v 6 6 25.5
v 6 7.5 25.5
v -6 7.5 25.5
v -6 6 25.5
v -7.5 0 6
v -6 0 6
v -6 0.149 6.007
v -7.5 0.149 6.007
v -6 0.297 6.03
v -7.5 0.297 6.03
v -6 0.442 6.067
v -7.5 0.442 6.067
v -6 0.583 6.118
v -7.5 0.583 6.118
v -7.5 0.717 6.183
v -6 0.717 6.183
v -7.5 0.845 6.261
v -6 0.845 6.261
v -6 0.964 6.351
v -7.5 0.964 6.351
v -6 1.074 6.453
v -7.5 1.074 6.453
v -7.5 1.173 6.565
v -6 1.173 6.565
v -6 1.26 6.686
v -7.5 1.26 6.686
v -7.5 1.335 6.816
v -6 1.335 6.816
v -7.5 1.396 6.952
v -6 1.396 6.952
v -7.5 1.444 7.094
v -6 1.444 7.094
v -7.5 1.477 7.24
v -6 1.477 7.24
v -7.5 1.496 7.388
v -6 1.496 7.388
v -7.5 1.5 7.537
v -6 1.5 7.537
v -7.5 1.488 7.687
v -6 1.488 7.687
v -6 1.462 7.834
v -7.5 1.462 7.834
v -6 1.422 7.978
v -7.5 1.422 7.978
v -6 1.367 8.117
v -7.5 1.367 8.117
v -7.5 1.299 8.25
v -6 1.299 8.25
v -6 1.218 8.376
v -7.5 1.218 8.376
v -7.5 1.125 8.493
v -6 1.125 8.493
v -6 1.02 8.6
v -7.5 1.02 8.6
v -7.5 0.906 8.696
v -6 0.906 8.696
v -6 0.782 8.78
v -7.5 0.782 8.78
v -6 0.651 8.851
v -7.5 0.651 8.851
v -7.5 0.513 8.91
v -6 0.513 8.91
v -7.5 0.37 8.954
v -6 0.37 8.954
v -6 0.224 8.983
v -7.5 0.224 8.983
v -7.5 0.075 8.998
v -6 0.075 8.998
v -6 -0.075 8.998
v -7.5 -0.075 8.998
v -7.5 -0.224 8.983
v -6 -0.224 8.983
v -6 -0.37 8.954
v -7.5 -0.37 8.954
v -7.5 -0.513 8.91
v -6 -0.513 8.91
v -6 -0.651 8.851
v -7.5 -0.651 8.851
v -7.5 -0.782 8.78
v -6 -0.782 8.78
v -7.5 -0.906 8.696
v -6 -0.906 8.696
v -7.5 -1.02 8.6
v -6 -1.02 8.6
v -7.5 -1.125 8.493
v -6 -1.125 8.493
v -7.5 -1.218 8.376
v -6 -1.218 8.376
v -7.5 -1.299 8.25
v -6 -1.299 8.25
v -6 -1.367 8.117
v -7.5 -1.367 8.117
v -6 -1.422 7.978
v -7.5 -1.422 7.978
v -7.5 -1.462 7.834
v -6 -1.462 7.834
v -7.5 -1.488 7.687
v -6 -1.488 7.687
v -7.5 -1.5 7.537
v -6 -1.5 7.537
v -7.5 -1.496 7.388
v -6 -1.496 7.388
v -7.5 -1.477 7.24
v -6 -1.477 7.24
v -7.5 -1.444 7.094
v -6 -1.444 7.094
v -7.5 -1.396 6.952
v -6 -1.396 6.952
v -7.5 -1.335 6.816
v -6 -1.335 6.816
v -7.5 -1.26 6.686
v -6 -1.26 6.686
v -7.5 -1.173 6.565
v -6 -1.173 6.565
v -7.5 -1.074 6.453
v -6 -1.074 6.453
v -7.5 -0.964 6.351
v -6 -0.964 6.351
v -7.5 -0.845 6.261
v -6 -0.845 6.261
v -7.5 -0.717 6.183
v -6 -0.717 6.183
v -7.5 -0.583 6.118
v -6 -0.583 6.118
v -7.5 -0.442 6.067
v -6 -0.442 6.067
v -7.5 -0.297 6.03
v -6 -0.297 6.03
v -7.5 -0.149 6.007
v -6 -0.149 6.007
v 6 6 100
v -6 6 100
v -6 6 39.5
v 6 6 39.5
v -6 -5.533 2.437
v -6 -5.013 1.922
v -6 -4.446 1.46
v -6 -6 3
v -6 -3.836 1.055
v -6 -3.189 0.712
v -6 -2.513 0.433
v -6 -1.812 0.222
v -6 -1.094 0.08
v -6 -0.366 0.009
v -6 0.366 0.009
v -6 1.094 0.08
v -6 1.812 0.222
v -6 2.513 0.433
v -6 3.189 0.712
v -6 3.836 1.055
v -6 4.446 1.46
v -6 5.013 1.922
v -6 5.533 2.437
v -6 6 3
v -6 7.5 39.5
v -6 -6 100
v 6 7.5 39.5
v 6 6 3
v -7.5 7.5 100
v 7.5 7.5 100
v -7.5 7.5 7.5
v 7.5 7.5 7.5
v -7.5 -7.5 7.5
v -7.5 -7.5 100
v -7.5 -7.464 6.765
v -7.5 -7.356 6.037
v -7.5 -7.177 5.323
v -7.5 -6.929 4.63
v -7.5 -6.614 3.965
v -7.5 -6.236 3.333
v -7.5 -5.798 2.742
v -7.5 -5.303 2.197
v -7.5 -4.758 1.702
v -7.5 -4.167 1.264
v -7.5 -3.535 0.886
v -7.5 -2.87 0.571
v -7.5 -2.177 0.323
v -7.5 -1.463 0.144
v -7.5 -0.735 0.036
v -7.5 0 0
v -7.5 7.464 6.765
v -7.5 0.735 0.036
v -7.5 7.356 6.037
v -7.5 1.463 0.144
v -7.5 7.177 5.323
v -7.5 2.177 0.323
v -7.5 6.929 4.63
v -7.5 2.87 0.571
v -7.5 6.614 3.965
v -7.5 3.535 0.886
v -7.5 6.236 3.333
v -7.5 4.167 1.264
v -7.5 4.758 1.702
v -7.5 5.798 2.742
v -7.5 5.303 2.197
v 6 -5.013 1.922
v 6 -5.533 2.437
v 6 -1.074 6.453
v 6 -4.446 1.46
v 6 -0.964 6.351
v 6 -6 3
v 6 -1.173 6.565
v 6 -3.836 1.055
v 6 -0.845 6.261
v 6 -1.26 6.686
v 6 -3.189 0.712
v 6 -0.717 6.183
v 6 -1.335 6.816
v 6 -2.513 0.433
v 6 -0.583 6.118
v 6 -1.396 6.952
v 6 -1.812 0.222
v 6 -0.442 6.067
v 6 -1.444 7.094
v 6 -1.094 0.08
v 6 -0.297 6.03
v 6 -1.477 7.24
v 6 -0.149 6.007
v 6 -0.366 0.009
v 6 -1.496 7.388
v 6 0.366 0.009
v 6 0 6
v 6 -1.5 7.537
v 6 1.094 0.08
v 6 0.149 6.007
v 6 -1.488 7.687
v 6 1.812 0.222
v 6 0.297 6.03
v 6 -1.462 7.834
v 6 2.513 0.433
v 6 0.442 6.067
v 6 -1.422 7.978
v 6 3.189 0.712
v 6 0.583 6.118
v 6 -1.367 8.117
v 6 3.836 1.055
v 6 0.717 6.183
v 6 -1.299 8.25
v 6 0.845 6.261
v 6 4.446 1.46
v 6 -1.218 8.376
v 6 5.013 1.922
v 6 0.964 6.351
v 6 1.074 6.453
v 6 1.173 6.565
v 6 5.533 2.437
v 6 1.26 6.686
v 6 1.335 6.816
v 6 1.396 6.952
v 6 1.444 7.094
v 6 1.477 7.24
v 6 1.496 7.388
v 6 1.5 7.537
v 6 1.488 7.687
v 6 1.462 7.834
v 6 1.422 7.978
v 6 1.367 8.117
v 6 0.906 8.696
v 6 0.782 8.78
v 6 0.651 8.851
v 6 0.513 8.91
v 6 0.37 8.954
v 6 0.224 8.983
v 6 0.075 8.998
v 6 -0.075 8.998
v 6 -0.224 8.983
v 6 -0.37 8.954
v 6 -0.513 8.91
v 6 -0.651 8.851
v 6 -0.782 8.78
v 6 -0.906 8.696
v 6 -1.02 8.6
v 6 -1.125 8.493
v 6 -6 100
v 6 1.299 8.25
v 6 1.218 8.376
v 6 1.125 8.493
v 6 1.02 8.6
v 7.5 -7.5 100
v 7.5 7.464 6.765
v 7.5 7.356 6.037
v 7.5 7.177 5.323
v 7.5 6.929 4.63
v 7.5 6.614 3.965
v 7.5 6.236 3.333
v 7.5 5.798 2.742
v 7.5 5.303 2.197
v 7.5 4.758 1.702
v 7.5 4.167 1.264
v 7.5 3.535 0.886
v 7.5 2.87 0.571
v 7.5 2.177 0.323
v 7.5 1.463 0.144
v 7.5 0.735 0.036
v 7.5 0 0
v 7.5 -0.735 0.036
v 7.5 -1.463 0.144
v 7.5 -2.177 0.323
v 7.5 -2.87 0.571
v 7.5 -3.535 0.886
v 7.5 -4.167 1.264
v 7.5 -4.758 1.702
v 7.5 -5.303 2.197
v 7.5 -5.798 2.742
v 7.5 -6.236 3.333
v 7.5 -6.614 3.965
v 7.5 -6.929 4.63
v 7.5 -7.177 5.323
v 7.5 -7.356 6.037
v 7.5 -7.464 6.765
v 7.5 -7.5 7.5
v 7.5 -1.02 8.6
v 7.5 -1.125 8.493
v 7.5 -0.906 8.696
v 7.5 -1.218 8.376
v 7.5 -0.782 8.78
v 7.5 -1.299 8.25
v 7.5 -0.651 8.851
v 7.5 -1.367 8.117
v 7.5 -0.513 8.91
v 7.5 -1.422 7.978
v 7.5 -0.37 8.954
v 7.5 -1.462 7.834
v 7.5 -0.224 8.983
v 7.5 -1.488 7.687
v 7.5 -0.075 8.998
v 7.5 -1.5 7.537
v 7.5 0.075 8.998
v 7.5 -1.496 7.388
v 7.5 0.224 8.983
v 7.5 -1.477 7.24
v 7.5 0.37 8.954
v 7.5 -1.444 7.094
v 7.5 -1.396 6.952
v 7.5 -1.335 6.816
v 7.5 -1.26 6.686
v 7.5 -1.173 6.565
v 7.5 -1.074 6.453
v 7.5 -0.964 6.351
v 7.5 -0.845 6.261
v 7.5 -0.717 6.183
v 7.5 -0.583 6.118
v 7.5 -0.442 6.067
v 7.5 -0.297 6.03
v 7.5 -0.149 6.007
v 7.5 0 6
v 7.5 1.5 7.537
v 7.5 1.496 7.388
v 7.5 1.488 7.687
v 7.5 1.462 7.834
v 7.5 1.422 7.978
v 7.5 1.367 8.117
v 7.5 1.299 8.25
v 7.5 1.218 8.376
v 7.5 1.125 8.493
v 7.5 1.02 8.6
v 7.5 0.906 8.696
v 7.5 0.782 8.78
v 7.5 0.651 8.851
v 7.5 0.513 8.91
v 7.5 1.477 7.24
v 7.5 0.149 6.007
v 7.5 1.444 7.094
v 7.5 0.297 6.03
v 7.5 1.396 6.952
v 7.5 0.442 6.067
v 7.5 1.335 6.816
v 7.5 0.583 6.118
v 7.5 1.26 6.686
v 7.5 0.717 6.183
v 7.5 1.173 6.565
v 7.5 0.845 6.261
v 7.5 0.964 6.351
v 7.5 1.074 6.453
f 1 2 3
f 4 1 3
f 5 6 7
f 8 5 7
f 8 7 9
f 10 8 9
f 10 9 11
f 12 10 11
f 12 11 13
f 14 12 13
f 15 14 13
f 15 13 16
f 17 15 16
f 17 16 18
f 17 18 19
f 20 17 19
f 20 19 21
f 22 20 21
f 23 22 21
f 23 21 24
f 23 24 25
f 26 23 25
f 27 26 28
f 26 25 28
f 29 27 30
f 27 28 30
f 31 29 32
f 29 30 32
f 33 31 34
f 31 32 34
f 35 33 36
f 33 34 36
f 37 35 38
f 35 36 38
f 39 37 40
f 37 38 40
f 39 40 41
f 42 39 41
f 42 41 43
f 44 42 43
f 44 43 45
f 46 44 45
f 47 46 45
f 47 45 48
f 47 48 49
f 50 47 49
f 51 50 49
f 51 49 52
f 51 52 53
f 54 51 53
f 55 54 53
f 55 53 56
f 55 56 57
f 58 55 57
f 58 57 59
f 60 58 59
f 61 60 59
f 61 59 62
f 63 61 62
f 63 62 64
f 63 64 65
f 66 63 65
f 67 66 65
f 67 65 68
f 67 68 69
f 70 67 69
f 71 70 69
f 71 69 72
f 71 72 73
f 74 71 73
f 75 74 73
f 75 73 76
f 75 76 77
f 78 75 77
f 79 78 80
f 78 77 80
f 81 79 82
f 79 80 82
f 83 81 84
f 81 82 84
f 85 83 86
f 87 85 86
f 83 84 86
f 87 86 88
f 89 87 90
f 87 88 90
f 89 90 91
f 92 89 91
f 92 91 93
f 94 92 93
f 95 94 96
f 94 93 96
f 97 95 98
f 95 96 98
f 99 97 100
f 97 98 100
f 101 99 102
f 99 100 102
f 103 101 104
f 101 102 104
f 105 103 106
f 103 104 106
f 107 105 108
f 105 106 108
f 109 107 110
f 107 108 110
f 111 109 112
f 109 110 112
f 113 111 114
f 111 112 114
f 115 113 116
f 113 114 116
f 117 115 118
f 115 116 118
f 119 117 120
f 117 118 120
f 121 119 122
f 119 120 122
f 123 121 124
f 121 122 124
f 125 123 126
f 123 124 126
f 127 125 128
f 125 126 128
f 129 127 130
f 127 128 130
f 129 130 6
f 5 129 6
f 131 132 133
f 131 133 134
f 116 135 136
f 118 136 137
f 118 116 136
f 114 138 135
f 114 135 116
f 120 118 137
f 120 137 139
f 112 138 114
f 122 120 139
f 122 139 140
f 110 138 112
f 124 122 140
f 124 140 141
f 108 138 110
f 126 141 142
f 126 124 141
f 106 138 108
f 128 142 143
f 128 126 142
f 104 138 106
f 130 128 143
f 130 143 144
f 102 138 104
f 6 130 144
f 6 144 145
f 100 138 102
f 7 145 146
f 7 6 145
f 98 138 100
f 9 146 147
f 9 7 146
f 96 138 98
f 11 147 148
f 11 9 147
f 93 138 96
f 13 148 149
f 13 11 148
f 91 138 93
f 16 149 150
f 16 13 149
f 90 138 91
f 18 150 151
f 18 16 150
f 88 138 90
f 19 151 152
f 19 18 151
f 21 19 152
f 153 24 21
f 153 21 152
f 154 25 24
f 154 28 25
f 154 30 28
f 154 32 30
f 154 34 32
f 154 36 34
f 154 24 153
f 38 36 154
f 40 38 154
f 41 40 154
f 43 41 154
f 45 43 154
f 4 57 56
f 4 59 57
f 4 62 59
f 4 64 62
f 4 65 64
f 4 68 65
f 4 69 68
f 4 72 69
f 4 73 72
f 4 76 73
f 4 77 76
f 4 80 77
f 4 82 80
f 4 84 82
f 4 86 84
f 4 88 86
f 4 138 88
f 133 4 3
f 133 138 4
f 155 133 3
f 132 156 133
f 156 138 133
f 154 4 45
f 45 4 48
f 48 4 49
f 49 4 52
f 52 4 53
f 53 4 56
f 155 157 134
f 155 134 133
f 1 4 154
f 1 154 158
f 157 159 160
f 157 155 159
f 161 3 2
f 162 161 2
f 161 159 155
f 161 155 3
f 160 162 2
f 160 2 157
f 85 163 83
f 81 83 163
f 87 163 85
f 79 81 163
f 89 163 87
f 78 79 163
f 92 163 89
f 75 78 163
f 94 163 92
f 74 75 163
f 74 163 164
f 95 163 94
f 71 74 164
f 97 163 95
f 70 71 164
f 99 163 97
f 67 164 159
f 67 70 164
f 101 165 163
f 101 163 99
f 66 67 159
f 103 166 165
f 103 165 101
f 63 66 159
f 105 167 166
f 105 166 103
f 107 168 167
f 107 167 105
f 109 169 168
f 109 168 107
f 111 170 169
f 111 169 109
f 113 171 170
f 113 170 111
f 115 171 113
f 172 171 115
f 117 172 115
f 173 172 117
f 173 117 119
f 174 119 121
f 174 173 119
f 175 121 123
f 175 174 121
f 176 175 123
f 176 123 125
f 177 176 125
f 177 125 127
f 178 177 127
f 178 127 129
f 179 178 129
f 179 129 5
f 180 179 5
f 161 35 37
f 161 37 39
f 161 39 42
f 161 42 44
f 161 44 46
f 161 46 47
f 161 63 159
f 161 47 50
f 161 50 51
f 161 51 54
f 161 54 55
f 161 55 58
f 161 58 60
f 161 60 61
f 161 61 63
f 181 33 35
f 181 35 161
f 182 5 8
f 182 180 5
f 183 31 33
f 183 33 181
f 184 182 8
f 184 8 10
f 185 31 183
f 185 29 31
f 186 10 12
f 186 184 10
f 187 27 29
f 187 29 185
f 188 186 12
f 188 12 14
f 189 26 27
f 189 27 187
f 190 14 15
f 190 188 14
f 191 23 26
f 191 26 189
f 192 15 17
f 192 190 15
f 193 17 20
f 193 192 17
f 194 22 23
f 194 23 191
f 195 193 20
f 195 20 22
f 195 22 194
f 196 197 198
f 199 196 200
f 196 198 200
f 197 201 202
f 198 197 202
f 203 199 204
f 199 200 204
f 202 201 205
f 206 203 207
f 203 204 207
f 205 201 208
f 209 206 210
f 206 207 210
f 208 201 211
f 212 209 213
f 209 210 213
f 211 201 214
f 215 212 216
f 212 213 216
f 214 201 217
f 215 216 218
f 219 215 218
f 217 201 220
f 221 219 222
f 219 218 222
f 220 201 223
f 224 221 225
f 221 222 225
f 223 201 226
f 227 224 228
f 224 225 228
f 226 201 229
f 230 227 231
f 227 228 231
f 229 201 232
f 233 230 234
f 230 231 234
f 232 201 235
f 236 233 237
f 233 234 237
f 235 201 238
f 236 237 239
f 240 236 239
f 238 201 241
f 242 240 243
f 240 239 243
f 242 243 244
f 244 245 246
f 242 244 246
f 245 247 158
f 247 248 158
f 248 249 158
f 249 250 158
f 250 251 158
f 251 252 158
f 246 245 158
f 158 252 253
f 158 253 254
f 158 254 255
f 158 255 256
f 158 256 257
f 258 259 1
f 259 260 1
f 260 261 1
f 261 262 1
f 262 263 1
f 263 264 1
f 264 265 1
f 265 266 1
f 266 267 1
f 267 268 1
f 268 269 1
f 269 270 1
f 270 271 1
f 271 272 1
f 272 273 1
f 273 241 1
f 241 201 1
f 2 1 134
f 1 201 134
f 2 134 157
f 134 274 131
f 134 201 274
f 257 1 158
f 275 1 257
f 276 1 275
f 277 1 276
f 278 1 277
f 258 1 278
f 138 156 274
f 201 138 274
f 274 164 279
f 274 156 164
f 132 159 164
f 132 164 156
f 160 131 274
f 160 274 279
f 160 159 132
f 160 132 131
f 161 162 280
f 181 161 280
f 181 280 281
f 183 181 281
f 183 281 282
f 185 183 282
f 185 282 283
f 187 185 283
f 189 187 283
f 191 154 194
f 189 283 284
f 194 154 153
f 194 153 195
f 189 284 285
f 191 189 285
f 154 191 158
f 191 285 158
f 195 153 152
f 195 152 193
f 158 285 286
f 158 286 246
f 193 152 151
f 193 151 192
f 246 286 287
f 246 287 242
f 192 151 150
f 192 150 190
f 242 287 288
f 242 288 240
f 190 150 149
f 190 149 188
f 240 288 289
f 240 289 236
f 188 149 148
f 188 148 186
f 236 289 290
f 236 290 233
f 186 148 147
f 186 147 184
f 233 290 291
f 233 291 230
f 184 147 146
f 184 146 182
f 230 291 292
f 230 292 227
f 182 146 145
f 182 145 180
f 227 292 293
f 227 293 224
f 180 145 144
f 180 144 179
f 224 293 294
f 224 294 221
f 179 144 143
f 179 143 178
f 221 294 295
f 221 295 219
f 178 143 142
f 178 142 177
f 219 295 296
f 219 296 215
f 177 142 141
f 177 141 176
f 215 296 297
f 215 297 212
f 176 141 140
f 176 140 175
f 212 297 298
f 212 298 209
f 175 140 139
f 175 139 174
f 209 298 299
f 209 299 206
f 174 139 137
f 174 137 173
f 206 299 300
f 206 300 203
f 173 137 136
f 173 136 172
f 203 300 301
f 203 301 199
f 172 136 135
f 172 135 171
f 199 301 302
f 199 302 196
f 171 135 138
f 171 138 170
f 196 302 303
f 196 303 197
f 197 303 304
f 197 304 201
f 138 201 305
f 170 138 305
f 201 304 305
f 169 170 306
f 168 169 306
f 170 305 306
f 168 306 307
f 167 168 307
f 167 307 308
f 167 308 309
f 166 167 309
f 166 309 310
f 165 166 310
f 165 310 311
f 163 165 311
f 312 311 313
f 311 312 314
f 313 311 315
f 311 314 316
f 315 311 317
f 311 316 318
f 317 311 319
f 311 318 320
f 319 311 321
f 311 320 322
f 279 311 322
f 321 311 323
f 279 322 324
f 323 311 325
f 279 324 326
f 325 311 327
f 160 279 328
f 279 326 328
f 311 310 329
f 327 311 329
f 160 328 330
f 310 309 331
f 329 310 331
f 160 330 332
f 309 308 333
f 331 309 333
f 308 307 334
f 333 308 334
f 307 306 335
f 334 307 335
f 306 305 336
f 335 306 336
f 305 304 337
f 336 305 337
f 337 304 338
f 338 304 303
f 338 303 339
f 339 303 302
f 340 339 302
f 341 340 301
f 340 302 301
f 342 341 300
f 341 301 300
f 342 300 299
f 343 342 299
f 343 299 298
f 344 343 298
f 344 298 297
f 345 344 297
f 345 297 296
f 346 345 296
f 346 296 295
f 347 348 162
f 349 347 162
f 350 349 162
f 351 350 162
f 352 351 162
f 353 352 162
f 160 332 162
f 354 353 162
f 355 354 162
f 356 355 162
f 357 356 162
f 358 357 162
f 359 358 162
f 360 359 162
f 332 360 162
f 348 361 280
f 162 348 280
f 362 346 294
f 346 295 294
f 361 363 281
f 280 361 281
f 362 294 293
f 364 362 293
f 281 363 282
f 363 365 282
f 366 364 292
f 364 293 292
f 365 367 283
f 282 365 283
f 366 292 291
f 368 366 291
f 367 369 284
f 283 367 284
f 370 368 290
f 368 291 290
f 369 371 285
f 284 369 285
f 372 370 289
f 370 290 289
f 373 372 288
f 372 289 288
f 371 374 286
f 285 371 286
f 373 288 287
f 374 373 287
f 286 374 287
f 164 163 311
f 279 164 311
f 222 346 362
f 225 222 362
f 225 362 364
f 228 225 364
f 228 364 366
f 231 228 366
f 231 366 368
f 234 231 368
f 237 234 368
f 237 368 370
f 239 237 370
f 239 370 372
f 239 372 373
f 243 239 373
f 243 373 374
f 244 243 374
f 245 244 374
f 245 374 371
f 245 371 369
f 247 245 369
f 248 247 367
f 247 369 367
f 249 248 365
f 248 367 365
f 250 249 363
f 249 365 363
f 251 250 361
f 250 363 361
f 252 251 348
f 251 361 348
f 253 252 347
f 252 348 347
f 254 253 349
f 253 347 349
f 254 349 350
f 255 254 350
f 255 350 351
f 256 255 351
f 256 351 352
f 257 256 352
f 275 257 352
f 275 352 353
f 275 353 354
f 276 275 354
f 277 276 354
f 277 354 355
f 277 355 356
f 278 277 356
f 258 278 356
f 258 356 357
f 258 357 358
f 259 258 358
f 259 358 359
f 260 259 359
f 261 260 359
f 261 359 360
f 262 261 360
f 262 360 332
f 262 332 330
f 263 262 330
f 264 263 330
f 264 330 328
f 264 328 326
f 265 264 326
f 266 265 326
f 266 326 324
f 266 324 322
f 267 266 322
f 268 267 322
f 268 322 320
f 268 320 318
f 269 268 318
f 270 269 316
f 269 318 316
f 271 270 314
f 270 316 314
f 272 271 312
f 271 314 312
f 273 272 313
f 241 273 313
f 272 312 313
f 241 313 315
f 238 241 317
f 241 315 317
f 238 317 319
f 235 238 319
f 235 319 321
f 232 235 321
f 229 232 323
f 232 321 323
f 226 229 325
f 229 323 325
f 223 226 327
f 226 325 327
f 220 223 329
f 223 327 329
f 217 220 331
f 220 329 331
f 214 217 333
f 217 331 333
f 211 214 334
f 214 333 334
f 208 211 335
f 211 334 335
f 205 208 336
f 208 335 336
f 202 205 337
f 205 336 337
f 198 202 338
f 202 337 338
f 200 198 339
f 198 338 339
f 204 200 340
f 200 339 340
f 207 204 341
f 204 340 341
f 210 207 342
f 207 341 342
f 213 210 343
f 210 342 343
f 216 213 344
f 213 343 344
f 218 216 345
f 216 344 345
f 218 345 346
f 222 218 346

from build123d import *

# Parameters (mm, degrees)
ESQUISSE1_W             = 15
ESQUISSE1_H             = 15
EXTRUSION1_DEPTH        = 100
ESQUISSE2_W             = 12
ESQUISSE2_H             = 12
EXTRUSION2_DEPTH        = 101.560926806
CONG_1_R                = 7.5
ESQUISSE3_R             = 1.5
EXTRUSION3_DEPTH        = 102.396498953
ESQUISSE4_W             = 12
ESQUISSE4_H             = 14
ENL_V_MAT_EXTRU_1_DEPTH = 3


with BuildPart() as part:
    # Esquisse1 → Extrusion1 (new body)
    with BuildSketch(Plane.XY):
        Rectangle(ESQUISSE1_W, ESQUISSE1_H)
    extrude(amount=EXTRUSION1_DEPTH)

    # Esquisse2 → Extrusion2 (cut, through all)
    with BuildSketch(Plane.XY.offset(100)):
        Rectangle(ESQUISSE2_W, ESQUISSE2_H)
    extrude(amount=-EXTRUSION2_DEPTH, mode=Mode.SUBTRACT)

    # Congé1
    # the kernel refuses this fillet: 7.5 mm, written as the material it takes off along each edge
    with BuildSketch(Plane(origin=(-26.25, -7.5, 0), x_dir=(0, 0, 1), z_dir=(1, 0, 0))) as cong_1_piece_1:
        with BuildLine():
            CenterArc((CONG_1_R, -CONG_1_R), CONG_1_R, 90, 90)
            Line((0, -CONG_1_R), (0, 0))
            Line((0, 0), (CONG_1_R, 0))
        make_face()
    extrude(amount=52.5, mode=Mode.SUBTRACT)
    with BuildSketch(Plane(origin=(26.25, 7.5, 0), x_dir=(0, -1, 0), z_dir=(-1, 0, 0))) as cong_1_piece_2:
        with BuildLine():
            CenterArc((CONG_1_R, CONG_1_R), CONG_1_R, 180, 90)
            Line((0, CONG_1_R), (0, 0))
            Line((0, 0), (CONG_1_R, 0))
        make_face()
    extrude(amount=52.5, mode=Mode.SUBTRACT)

    # Esquisse3 → Extrusion3 (cut, through all)
    with BuildSketch(Plane(origin=(7.5, 0, 0), x_dir=(0, 0, -1), z_dir=(1, 0, 0))):
        with Locations((-7.5, 0)):
            Circle(ESQUISSE3_R)
    extrude(amount=-EXTRUSION3_DEPTH, mode=Mode.SUBTRACT)

    # Esquisse4 → Enlèv. mat.-Extru.1 (cut)
    with BuildSketch(Plane(origin=(0, 7.5, 0), x_dir=(-1, 0, 0), z_dir=(0, 1, 0))):
        with Locations((0, 32.5)):
            Rectangle(ESQUISSE4_W, ESQUISSE4_H)
    extrude(amount=-ENL_V_MAT_EXTRU_1_DEPTH, mode=Mode.SUBTRACT)


solid = part.part
